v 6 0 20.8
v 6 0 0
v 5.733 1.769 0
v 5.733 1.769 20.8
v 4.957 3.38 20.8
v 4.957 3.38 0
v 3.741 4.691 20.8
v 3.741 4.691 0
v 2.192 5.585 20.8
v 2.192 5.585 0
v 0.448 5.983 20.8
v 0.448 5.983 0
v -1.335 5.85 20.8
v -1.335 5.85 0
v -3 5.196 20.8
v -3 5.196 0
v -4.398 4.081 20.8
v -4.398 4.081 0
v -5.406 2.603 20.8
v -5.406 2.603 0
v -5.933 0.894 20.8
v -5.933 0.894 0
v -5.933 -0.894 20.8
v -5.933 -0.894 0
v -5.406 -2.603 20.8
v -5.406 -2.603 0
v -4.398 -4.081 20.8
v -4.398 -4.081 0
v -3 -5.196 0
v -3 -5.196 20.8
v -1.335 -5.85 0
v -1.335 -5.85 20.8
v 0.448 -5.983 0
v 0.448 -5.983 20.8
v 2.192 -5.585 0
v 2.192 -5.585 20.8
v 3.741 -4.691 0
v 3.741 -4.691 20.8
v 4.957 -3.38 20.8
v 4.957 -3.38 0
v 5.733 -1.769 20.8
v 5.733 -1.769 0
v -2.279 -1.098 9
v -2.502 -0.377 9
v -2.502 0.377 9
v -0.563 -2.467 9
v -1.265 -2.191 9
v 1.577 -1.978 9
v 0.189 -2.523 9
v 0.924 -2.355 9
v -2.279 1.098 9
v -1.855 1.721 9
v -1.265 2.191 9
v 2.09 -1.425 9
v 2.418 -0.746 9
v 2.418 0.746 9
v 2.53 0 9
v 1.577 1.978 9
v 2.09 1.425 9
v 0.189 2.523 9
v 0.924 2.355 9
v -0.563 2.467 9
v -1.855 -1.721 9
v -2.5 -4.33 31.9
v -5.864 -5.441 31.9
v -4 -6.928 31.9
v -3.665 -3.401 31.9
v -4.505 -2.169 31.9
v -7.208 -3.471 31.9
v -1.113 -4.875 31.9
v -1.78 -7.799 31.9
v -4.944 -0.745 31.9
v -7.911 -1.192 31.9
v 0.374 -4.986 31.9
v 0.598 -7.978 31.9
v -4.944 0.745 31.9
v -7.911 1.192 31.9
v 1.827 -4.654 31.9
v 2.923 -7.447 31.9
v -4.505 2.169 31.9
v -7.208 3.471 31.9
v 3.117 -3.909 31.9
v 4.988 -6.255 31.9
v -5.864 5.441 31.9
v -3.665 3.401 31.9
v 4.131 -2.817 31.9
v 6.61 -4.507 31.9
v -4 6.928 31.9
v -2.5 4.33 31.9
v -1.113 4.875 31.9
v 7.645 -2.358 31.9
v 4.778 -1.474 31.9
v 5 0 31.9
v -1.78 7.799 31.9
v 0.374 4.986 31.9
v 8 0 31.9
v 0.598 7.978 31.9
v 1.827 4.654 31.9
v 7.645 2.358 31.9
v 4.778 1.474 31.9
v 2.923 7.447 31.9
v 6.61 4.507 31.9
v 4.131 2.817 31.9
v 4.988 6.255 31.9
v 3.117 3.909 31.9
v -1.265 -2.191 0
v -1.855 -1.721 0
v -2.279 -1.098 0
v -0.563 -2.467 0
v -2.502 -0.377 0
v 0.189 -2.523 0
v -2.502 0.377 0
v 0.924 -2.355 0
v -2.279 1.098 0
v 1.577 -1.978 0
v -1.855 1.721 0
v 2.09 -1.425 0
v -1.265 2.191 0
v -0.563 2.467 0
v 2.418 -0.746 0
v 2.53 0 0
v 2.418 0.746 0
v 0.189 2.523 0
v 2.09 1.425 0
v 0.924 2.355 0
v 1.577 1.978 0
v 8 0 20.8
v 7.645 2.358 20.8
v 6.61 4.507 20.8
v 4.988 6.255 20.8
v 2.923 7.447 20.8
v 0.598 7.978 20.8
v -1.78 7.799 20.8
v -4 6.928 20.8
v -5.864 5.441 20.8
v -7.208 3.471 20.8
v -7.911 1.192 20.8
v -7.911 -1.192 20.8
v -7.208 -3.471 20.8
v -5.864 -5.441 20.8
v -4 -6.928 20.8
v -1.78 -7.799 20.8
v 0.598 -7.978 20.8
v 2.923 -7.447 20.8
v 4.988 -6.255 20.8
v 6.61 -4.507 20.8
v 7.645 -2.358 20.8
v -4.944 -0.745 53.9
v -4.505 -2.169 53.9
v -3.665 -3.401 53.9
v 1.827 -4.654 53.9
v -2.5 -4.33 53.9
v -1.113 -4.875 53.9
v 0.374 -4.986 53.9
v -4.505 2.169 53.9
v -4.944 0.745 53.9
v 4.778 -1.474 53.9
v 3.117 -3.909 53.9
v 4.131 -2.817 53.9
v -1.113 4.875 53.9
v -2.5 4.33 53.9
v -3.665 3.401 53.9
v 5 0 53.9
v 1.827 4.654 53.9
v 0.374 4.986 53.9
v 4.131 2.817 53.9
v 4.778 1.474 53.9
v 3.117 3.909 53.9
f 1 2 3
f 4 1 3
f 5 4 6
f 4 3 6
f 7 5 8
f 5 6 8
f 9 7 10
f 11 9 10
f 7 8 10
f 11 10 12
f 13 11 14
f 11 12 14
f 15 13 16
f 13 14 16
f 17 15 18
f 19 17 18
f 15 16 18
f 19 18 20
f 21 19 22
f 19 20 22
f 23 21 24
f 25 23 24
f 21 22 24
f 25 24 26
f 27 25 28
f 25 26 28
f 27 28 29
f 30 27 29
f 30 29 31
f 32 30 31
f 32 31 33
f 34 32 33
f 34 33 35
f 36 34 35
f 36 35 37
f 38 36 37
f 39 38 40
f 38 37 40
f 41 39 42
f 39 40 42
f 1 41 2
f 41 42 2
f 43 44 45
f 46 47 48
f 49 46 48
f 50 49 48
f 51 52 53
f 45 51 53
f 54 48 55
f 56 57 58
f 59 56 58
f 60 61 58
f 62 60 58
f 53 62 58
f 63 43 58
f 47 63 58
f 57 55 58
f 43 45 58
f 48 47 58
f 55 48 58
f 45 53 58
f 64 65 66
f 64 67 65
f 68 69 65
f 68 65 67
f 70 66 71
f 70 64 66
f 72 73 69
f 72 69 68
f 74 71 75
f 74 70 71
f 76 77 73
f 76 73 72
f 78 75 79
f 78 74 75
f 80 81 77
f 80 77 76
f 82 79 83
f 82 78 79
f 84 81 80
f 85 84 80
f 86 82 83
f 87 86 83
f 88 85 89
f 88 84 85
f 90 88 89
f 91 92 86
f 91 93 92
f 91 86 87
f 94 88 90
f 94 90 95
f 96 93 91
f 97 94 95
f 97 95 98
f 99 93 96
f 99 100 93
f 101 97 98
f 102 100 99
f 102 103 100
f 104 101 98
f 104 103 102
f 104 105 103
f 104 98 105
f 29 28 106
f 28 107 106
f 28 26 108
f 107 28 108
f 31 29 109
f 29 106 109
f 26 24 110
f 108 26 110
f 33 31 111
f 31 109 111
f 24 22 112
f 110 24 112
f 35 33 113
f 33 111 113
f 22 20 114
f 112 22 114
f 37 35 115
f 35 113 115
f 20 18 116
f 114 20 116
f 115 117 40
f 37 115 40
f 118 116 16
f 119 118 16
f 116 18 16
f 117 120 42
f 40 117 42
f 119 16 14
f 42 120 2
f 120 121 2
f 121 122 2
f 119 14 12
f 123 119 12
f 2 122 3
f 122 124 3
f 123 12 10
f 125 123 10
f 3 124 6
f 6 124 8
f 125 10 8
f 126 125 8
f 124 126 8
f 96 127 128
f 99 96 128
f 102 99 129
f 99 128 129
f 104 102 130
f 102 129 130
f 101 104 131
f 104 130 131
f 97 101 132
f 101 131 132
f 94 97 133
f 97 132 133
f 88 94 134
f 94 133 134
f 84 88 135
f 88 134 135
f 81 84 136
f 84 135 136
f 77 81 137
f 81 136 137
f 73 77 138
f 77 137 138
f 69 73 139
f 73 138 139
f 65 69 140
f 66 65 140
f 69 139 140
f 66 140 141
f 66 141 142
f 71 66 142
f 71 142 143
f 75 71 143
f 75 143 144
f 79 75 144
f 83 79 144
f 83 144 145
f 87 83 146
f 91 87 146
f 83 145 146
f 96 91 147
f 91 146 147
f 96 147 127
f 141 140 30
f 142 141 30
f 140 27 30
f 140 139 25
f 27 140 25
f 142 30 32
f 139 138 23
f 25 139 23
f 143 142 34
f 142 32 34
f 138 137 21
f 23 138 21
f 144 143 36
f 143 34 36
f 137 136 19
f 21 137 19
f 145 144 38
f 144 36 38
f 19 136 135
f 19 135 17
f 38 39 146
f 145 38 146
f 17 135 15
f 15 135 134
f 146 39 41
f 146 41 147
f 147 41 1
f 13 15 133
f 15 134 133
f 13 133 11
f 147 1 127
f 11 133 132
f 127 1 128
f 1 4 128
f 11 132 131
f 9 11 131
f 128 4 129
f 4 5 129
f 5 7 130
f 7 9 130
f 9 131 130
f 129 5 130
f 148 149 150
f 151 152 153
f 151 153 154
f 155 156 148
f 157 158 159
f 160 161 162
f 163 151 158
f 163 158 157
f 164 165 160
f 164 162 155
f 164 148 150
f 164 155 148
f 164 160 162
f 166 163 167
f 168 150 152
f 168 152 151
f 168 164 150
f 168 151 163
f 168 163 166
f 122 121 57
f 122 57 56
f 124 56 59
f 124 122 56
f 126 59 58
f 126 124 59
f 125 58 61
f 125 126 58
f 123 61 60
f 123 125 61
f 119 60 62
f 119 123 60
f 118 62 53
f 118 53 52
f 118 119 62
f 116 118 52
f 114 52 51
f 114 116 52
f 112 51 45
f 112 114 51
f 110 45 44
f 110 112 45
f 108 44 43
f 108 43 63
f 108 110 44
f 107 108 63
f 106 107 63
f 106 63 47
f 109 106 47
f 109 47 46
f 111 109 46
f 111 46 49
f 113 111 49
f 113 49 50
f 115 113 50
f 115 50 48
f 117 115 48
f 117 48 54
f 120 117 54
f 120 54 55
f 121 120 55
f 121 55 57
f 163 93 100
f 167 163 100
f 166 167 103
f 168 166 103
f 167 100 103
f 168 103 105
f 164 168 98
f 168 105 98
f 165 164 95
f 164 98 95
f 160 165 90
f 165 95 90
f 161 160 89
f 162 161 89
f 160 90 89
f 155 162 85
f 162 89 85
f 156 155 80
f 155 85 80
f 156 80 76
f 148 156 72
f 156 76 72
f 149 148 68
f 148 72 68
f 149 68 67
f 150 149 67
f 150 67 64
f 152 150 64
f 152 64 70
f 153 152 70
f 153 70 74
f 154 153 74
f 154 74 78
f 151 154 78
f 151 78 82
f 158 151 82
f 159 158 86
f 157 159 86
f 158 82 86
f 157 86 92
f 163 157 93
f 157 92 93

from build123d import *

# Parameters (mm, degrees)
S01_12_MM_BEARING_JOURNAL_R                  = 6
F_01_12_MM_BEARING_JOURNAL_DEPTH             = 20.8
F_02_START                                   = 20.8
S02_GROUNDED_JOURNAL_SHOULDER_R              = 8
F_02_GROUNDED_JOURNAL_SHOULDER_DEPTH         = 11.1
F_03_START                                   = 31.9
S03_M10_THREADED_BRIDGE_STEM_R               = 5
F_03_M10_THREADED_BRIDGE_STEM_DEPTH          = 22
F_04_START                                   = -0.1
S04_M5_TAPPED_END_NOMINAL_THREAD_ENV_R       = 2.53
F_04_M5_TAPPED_END_NOMINAL_THREAD_ENVE_DEPTH = 9.1


with BuildPart() as part:
    # S01 - 12 mm bearing journal → 01 - 12 mm bearing journal (new body)
    with BuildSketch(Plane.XY):
        Circle(S01_12_MM_BEARING_JOURNAL_R)
    extrude(amount=F_01_12_MM_BEARING_JOURNAL_DEPTH)

    # S02 - Grounded journal shoulder → 02 - Grounded journal shoulder (add)
    with BuildSketch(Plane.XY.offset(F_02_START)):
        Circle(S02_GROUNDED_JOURNAL_SHOULDER_R)
    extrude(amount=F_02_GROUNDED_JOURNAL_SHOULDER_DEPTH)

    # S03 - M10 threaded bridge stem → 03 - M10 threaded bridge stem (add)
    with BuildSketch(Plane.XY.offset(F_03_START)):
        Circle(S03_M10_THREADED_BRIDGE_STEM_R)
    extrude(amount=F_03_M10_THREADED_BRIDGE_STEM_DEPTH)

    # S04 - M5 tapped end - nominal thread envelope → 04 - M5 tapped end - nominal thread envelope (cut)
    with BuildSketch(Plane.XY.offset(F_04_START)):
        Circle(S04_M5_TAPPED_END_NOMINAL_THREAD_ENV_R)
    extrude(amount=F_04_M5_TAPPED_END_NOMINAL_THREAD_ENVE_DEPTH, mode=Mode.SUBTRACT)


solid = part.part
